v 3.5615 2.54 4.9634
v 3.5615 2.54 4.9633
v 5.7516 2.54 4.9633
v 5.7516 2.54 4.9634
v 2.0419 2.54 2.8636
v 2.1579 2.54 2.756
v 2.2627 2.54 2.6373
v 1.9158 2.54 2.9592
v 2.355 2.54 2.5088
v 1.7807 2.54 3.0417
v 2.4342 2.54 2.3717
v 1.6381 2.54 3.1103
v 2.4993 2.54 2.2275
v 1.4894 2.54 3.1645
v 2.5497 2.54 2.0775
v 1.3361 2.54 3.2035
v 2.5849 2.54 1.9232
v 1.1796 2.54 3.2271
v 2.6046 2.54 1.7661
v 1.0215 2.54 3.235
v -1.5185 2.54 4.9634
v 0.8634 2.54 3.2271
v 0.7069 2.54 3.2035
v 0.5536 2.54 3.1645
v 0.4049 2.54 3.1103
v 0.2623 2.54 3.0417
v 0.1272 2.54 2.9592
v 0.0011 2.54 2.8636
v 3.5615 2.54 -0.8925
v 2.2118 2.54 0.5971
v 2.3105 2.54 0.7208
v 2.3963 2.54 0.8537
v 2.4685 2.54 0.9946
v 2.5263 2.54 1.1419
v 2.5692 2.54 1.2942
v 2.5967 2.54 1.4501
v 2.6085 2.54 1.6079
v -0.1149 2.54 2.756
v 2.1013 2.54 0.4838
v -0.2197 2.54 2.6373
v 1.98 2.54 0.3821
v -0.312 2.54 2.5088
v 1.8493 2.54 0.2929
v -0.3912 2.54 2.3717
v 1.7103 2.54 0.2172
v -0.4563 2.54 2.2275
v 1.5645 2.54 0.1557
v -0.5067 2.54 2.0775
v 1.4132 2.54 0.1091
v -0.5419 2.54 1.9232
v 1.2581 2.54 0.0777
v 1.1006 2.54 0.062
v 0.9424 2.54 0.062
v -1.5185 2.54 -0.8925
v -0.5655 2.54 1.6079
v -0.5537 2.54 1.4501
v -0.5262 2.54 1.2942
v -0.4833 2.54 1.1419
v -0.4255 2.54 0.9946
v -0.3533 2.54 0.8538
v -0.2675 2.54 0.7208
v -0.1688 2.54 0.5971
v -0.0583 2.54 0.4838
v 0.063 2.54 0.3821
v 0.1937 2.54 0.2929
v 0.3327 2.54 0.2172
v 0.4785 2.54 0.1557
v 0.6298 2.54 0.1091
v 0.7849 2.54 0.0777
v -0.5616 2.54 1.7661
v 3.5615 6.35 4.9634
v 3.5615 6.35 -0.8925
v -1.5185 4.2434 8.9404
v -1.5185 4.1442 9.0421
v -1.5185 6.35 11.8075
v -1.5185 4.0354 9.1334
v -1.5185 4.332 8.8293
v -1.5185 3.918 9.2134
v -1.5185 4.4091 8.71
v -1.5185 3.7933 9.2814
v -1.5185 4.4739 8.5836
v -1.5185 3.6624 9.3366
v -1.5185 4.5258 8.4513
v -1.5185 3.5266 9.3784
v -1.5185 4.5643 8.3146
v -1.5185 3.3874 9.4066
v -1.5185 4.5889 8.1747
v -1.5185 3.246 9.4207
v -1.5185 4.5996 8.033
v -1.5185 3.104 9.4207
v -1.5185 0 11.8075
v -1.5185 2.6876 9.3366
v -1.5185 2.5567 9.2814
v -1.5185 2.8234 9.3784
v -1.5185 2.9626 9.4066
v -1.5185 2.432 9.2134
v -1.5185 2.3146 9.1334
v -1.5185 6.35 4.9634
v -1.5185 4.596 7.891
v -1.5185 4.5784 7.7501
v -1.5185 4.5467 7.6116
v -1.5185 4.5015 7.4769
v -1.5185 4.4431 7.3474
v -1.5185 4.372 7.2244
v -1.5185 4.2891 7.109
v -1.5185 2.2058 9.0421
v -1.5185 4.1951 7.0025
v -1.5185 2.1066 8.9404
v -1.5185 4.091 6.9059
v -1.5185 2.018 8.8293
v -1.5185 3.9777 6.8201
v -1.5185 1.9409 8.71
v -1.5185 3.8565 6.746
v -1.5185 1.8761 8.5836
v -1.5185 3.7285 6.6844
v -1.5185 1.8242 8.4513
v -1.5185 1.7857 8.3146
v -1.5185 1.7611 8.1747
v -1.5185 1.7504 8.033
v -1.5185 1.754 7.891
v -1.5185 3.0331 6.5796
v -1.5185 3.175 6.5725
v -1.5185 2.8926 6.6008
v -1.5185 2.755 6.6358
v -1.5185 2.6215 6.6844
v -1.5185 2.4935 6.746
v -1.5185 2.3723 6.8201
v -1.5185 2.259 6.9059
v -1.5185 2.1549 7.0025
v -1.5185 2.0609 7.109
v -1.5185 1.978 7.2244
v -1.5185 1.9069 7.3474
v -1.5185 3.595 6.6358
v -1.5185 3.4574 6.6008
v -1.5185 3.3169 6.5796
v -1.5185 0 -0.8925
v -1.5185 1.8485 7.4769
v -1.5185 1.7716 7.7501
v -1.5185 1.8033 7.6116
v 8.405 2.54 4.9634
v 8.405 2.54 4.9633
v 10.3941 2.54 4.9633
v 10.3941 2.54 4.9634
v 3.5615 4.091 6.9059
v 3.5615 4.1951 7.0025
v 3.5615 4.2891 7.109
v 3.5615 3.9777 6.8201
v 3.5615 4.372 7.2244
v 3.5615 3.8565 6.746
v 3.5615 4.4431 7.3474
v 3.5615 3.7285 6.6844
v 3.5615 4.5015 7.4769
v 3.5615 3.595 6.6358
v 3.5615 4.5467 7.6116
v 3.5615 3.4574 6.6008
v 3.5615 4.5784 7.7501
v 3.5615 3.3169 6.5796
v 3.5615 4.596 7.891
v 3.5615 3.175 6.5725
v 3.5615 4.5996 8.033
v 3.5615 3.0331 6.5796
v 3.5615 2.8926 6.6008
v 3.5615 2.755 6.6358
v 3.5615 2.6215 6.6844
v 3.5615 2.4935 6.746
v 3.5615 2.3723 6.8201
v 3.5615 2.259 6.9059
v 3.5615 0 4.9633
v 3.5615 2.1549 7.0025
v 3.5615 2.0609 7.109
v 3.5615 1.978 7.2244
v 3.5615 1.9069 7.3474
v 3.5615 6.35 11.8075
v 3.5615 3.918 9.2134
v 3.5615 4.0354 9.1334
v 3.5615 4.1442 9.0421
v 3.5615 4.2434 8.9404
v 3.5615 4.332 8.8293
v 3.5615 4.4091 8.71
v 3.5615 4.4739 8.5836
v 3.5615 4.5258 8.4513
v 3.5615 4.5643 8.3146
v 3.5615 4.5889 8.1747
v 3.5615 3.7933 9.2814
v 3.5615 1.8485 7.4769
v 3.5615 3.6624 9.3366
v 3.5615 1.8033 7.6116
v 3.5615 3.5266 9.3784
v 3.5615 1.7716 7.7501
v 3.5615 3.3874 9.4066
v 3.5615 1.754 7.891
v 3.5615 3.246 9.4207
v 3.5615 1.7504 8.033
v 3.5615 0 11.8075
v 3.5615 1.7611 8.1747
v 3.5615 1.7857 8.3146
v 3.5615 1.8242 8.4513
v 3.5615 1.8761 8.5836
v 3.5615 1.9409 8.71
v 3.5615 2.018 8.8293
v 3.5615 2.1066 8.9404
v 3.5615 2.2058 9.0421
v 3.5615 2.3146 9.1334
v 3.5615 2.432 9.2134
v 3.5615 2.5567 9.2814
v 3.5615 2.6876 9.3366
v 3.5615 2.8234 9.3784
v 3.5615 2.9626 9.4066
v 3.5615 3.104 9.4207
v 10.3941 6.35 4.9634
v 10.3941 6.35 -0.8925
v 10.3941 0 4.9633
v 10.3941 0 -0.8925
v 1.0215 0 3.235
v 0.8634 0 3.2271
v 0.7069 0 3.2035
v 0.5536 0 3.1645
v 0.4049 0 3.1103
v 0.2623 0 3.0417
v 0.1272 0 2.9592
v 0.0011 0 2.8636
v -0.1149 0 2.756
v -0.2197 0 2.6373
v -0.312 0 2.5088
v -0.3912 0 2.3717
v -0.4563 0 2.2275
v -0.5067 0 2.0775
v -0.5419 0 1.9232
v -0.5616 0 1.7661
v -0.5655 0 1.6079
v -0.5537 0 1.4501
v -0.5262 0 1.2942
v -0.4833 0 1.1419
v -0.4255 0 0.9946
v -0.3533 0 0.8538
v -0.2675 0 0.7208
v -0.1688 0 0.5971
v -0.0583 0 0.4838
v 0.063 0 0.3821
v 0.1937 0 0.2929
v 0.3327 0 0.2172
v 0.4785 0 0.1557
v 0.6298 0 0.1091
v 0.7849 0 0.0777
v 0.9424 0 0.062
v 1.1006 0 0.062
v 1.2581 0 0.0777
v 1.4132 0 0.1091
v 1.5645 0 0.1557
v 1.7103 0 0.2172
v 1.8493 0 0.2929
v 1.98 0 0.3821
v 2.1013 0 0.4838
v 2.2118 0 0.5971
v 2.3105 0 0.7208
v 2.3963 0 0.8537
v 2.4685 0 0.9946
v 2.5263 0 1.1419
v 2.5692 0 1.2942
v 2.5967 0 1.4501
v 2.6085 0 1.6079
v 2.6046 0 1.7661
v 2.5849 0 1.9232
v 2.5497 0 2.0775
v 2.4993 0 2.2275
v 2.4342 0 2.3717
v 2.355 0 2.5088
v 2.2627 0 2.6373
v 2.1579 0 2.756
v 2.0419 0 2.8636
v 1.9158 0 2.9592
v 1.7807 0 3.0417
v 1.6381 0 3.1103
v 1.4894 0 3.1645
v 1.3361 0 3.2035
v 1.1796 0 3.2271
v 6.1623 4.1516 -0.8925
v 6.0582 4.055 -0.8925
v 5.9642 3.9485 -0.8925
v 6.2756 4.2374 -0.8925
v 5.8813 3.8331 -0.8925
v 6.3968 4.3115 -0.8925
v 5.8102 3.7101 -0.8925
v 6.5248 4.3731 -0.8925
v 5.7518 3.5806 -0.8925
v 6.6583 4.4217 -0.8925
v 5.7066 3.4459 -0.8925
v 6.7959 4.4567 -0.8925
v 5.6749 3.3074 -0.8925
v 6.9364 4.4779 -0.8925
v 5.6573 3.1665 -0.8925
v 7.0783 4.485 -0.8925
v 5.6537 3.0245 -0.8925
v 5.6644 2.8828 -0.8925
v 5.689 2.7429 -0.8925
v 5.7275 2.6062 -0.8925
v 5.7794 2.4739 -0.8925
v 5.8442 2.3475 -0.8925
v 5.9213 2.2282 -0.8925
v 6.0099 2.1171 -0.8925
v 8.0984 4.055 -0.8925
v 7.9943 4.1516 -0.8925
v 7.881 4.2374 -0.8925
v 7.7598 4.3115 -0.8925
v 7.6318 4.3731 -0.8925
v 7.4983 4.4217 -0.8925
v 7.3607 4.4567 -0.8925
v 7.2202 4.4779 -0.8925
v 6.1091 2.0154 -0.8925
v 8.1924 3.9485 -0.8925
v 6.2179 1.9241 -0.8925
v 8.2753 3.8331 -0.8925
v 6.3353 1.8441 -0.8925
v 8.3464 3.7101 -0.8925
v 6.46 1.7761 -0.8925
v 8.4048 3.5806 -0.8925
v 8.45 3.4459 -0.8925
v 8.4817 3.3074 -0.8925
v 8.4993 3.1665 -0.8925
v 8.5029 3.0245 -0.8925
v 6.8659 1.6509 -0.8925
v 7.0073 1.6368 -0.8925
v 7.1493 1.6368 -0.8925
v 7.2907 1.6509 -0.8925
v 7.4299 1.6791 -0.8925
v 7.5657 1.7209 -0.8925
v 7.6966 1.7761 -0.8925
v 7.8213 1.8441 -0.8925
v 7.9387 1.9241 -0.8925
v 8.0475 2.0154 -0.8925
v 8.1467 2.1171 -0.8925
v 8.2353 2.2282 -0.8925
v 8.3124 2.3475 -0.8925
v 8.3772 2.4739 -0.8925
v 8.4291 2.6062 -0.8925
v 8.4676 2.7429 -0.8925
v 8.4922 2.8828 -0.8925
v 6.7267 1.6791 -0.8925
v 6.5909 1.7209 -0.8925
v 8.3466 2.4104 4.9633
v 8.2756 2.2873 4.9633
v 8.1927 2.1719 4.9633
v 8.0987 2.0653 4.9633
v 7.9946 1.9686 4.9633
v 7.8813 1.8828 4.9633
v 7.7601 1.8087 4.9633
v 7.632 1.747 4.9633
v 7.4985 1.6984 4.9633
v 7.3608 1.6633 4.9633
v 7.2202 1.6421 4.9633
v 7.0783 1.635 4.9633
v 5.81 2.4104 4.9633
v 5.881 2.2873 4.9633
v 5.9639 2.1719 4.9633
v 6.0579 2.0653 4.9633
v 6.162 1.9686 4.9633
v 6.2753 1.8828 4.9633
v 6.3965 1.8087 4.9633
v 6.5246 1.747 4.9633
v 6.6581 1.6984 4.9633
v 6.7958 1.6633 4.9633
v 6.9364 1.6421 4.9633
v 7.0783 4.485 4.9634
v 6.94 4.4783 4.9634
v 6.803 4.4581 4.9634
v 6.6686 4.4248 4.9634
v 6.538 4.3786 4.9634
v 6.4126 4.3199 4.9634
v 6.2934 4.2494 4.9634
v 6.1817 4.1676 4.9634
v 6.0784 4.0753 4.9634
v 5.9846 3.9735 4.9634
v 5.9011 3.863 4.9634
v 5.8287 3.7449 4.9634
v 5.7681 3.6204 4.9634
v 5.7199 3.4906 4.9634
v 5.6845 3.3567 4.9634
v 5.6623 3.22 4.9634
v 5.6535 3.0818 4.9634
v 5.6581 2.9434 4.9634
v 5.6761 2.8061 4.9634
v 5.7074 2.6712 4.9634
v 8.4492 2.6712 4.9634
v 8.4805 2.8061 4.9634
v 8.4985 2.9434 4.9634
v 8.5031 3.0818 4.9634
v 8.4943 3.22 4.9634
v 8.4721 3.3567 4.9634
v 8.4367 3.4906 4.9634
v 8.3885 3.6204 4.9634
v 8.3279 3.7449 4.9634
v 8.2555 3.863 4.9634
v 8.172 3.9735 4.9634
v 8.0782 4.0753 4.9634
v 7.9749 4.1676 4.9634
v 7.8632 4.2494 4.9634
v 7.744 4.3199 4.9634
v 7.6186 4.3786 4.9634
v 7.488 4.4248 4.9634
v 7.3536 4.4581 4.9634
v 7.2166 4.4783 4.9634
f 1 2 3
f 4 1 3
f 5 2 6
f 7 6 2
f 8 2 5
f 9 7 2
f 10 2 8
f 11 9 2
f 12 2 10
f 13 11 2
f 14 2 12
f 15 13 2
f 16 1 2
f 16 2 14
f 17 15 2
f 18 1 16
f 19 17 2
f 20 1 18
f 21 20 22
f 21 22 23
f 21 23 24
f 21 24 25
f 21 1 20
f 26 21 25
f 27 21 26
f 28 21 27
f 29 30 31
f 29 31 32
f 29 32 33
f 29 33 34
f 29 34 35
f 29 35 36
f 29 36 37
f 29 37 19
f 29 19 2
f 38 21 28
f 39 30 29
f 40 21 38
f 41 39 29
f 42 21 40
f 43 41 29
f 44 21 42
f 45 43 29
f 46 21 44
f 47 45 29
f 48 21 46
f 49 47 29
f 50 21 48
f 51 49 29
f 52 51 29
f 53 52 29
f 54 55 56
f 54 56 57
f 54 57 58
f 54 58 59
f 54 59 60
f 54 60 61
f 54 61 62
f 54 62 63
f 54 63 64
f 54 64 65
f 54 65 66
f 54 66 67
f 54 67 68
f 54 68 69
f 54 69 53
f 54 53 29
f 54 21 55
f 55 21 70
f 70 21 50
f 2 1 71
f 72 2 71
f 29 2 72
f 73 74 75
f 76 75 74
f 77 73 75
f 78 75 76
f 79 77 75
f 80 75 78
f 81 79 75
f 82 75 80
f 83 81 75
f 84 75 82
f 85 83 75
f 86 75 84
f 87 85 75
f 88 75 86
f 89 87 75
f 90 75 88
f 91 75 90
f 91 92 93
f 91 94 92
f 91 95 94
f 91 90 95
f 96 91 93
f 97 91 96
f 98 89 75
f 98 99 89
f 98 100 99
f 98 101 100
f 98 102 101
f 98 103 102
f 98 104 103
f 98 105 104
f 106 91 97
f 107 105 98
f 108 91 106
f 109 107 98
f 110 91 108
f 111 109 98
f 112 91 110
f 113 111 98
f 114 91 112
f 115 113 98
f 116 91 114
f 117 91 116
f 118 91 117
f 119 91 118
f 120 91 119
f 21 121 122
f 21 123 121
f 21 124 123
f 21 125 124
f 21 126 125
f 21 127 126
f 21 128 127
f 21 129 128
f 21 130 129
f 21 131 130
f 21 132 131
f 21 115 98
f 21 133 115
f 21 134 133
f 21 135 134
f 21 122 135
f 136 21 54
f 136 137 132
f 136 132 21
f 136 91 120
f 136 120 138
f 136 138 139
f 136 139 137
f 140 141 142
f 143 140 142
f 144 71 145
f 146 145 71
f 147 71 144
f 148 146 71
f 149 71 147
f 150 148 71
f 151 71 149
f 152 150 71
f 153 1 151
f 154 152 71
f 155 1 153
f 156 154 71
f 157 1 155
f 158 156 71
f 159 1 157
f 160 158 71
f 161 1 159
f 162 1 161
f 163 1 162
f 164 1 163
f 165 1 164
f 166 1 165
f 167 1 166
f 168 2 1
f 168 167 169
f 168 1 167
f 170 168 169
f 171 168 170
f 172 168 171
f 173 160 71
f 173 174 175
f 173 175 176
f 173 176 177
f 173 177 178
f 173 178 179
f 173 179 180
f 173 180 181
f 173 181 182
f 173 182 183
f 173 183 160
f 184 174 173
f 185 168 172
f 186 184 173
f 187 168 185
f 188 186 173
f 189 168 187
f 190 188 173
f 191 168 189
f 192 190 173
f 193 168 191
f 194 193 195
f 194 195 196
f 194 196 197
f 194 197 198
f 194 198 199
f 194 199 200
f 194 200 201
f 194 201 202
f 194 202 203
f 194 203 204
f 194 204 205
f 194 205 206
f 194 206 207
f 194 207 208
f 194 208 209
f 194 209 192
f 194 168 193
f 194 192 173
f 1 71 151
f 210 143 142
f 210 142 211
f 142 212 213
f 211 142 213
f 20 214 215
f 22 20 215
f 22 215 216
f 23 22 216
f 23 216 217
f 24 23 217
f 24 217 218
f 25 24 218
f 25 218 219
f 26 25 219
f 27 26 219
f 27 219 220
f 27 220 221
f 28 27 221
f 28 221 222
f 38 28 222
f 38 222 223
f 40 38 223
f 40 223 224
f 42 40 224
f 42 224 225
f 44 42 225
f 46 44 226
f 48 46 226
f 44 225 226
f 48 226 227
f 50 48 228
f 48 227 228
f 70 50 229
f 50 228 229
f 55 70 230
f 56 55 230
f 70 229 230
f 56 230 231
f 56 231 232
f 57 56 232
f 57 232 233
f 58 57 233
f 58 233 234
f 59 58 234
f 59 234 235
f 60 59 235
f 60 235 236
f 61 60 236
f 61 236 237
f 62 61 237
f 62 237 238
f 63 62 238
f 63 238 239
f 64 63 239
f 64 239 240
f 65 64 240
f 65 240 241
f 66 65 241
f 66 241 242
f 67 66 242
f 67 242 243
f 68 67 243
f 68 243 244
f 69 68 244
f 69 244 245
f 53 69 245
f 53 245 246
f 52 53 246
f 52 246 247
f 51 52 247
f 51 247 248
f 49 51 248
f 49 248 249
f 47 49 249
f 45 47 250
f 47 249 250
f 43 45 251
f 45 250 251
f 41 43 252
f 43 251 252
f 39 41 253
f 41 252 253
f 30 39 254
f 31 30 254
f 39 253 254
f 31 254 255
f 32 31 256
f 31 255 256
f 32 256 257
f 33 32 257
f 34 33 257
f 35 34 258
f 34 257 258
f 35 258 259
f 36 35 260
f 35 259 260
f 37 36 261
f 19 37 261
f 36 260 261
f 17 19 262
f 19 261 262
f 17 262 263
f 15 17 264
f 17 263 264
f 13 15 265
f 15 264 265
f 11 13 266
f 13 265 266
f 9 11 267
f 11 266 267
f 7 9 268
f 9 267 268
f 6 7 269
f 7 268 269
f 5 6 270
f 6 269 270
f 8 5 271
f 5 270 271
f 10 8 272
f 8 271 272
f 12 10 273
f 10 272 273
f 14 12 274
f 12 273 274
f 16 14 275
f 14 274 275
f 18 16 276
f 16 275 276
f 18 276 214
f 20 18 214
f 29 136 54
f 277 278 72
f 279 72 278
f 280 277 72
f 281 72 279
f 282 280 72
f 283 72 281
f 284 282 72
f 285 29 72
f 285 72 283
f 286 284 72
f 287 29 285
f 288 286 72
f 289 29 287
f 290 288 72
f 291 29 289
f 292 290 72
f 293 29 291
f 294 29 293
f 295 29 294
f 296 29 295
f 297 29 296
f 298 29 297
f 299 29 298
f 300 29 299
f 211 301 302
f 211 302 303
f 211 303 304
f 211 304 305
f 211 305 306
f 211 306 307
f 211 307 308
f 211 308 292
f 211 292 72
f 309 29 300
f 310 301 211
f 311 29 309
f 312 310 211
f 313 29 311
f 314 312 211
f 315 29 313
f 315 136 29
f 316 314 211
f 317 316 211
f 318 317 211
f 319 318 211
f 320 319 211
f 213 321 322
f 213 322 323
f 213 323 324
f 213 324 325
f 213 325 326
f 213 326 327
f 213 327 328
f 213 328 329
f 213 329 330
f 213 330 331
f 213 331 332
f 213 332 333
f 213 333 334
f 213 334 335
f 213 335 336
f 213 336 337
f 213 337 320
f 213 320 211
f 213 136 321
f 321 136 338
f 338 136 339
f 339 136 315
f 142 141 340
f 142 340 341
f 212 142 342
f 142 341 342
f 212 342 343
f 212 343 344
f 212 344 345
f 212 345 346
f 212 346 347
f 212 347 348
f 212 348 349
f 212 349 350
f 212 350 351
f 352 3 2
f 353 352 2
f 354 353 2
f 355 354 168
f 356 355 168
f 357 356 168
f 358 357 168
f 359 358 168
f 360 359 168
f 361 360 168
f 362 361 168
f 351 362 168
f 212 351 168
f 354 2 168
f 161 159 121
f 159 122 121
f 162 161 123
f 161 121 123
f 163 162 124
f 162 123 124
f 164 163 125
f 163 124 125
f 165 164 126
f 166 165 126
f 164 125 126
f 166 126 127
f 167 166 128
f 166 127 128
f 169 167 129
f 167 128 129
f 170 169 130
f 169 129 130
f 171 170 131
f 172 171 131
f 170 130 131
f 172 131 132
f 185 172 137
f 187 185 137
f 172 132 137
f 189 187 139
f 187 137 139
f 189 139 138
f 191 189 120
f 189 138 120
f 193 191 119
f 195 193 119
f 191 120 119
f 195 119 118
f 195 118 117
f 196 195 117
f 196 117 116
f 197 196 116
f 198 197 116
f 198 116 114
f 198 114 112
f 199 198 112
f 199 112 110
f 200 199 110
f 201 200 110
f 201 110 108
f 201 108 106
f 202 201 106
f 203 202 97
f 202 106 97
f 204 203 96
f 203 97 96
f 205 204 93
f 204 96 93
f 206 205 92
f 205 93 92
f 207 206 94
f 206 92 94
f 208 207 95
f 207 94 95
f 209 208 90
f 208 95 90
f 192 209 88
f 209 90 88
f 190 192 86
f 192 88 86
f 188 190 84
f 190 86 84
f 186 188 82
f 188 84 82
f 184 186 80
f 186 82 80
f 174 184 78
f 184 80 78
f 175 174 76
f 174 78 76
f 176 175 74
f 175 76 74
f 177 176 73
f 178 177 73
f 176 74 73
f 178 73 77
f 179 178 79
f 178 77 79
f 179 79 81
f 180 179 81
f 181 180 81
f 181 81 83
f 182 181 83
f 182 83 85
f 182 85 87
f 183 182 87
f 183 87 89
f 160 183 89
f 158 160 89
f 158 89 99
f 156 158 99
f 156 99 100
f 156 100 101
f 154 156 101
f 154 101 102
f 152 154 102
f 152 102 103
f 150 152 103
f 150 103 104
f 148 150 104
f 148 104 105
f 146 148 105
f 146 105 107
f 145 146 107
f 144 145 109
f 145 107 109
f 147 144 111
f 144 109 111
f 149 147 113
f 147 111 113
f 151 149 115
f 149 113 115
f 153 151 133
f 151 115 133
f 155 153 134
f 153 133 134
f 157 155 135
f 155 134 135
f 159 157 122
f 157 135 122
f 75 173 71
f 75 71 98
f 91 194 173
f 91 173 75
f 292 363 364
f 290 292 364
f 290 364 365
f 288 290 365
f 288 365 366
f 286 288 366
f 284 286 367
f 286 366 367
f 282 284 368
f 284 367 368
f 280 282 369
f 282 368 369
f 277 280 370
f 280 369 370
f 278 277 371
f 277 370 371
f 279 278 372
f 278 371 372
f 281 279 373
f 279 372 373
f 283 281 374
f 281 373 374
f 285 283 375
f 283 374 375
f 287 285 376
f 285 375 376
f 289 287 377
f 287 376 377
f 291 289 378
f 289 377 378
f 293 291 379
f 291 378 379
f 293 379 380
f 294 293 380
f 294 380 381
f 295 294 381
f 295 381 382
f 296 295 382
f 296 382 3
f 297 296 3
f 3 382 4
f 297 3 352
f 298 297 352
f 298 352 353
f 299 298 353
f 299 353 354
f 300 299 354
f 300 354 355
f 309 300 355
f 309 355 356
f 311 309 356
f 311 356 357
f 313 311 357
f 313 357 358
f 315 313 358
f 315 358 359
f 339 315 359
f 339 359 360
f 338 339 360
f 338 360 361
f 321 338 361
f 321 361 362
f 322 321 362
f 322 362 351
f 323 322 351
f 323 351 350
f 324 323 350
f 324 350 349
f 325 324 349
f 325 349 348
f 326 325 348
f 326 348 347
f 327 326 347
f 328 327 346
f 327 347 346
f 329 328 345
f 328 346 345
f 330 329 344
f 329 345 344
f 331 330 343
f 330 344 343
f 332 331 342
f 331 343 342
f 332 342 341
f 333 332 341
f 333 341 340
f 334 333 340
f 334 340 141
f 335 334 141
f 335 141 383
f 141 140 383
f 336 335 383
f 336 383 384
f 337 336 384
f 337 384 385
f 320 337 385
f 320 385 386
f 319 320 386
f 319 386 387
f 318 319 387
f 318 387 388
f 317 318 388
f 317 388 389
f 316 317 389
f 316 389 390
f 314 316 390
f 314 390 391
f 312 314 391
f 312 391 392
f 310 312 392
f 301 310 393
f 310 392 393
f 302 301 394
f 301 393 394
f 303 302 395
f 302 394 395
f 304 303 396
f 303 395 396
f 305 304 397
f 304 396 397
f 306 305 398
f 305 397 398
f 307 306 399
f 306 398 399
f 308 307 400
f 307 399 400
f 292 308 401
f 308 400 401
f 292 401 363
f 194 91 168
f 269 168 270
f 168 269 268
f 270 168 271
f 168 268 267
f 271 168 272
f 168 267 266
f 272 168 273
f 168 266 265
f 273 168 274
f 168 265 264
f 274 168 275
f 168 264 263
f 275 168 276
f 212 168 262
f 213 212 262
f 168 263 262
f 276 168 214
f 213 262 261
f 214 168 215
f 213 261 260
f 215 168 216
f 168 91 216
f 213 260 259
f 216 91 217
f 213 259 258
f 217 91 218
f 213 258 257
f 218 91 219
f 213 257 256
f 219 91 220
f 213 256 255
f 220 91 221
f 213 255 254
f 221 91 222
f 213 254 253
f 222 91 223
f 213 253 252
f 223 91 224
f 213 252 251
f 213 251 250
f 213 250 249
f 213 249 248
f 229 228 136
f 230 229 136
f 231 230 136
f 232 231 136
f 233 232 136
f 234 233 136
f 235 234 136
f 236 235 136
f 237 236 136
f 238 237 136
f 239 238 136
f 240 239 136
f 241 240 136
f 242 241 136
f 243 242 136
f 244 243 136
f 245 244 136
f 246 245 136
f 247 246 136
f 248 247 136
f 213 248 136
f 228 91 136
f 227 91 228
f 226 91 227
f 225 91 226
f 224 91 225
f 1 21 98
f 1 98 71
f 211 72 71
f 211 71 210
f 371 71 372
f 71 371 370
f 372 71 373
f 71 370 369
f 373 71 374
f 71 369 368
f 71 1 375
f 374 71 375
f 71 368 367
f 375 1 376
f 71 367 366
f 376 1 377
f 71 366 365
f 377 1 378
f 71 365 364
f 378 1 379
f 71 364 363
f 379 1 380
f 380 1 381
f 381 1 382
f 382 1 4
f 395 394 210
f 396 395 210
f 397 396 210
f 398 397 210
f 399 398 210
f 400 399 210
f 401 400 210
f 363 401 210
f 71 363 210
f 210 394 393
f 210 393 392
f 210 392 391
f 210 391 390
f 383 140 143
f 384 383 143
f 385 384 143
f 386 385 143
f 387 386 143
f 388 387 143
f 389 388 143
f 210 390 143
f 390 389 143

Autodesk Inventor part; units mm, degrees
ref_plane "YZ Plane" through (0, 0, 0) normal (1, 0, 0) x (0, 1, 0)
ref_plane "XZ Plane" through (0, 0, 0) normal (0, 1, 0) x (-1, 0, 0)
ref_plane "XY Plane" through (0, 0, 0) normal (0, 0, 1) x (1, 0, 0)
sketch "Sketch20" plane through (0, 0, 0) normal (0, 1, 0) x (-1, 0, 0)
  line L0 (1.5185, -0.8925) -> (-3.5615, -0.8925)
  line L1 (-3.5615, -0.8925) -> (-3.5615, 11.8075)
  line L2 (-3.5615, 11.8075) -> (1.5185, 11.8075)
  line L3 (1.5185, 11.8075) -> (1.5185, -0.8925)
  line L4 (1.5185, 4.9634) -> (-3.5615, 4.9634)
  point P0 (0, 0)
  dimension "d56" = 5.08
  dimension "d57" = 12.7
extrude "Extrusion7" add sketch "Sketch20" along normal blind 2.54 contours L0 L1 L4 L3
extrude "Extrusion8" add sketch "Sketch20" along normal blind 6.35 contours L4 L1 L2 L3
sketch "Sketch21" plane through (0, 2.54, 0) normal (0, 1, 0) x (1, 0, 0)
  line L0 (3.5615, 0.8925) -> (-1.5185, 0.8925) projected
  line L1 (-1.5185, 0.8925) -> (-1.5185, -4.9634) projected
  point P0 (0, 0)
  point P1 (1.0215, -1.6475)
  dimension "d62" = 2.54
  dimension "d63" = 2.54
hole "Hole5" at (1.0215, 2.54, 1.6475) direction (0, -1, 0) diameter 3.175 end through all
sketch "Sketch22" plane through (3.5615, 0, -0.8925) normal (1, 0, 0) x (0, 0, -1)
  line L0 (-12.7, 6.35) -> (-5.8558, 6.35) projected
  line L1 (-12.7, 0) -> (-12.7, 6.35) projected
  point P0 (-0.8925, 0)
  point P1 (-8.89, 3.175)
  dimension "d71" = 3.175
  dimension "d72" = 3.81
hole "Hole6" at (3.5615, 3.175, 7.9975) direction (-1, 0, 0) diameter 2.85 end through all thread size "M3.5x0.6" class "6H" standard "ISO Metric profile"
sketch "Sketch23" plane through (3.5615, 0, -0.8925) normal (1, 0, 0) x (0, 0, -1)
  line L0 (-5.8558, 2.54) -> (-5.8558, 6.35) projected
  line L1 (-5.8558, 2.54) -> (-5.8558, 0)
  line L2 (-12.7, 0) -> (0, 0) projected
  line L3 (-5.8558, 2.54) -> (0, 2.54) projected
  line L4 (-5.8558, 2.54) -> (0, 2.54)
  line L5 (0, 2.54) -> (0, 0)
  point P0 (-0.8925, 0)
extrude "Extrusion9" add sketch "Sketch23" along normal blind 6.8326
sketch "Sketch24" plane through (0, 2.54, 0) normal (0, 1, 0) x (1, 0, 0)
  line L0 (3.5615, -4.9634) -> (10.3941, -4.9634) projected
  line L1 (3.5615, -4.9634) -> (3.5615, 0.8925)
  line L2 (-1.5185, 0.8925) -> (10.3941, 0.8925) projected
  line L3 (3.5615, 0.8925) -> (10.3941, 0.8925)
  line L4 (3.5615, -11.8075) -> (3.5615, -4.9634) projected
  line L5 (10.3941, -4.9634) -> (3.5615, -4.9634)
  line L6 (3.5615, -4.9634) -> (10.4876, -4.9634)
  line L7 (10.4876, -4.9634) -> (10.3941, -4.9634)
  line L8 (10.3941, -4.9634) -> (10.3941, 0.807)
  line L9 (10.3941, 0.807) -> (10.3941, 0.8925)
  point P0 (0, 0)
extrude "Extrusion10" add sketch "Sketch24" along normal blind 3.81
sketch "Sketch25" plane through (-1.5185, 0, -0.8925) normal (0, 0, -1) x (-1, 0, 0)
  line L0 (-11.9126, 6.35) -> (-5.08, 6.35) projected
  line L1 (-11.9126, 0) -> (-11.9126, 6.35) projected
  point P0 (-1.5185, 0)
  point P1 (-8.5968, 3.06)
  dimension "d84" = 3.29
  dimension "d85" = 3.3158
hole "Hole7" at (7.0783, 3.06, -0.8925) direction (0, 0, 1) diameter 2.85 end through all thread size "M3.5x0.6" class "6H" standard "ISO Metric profile"
properties part number "fileholddub"
